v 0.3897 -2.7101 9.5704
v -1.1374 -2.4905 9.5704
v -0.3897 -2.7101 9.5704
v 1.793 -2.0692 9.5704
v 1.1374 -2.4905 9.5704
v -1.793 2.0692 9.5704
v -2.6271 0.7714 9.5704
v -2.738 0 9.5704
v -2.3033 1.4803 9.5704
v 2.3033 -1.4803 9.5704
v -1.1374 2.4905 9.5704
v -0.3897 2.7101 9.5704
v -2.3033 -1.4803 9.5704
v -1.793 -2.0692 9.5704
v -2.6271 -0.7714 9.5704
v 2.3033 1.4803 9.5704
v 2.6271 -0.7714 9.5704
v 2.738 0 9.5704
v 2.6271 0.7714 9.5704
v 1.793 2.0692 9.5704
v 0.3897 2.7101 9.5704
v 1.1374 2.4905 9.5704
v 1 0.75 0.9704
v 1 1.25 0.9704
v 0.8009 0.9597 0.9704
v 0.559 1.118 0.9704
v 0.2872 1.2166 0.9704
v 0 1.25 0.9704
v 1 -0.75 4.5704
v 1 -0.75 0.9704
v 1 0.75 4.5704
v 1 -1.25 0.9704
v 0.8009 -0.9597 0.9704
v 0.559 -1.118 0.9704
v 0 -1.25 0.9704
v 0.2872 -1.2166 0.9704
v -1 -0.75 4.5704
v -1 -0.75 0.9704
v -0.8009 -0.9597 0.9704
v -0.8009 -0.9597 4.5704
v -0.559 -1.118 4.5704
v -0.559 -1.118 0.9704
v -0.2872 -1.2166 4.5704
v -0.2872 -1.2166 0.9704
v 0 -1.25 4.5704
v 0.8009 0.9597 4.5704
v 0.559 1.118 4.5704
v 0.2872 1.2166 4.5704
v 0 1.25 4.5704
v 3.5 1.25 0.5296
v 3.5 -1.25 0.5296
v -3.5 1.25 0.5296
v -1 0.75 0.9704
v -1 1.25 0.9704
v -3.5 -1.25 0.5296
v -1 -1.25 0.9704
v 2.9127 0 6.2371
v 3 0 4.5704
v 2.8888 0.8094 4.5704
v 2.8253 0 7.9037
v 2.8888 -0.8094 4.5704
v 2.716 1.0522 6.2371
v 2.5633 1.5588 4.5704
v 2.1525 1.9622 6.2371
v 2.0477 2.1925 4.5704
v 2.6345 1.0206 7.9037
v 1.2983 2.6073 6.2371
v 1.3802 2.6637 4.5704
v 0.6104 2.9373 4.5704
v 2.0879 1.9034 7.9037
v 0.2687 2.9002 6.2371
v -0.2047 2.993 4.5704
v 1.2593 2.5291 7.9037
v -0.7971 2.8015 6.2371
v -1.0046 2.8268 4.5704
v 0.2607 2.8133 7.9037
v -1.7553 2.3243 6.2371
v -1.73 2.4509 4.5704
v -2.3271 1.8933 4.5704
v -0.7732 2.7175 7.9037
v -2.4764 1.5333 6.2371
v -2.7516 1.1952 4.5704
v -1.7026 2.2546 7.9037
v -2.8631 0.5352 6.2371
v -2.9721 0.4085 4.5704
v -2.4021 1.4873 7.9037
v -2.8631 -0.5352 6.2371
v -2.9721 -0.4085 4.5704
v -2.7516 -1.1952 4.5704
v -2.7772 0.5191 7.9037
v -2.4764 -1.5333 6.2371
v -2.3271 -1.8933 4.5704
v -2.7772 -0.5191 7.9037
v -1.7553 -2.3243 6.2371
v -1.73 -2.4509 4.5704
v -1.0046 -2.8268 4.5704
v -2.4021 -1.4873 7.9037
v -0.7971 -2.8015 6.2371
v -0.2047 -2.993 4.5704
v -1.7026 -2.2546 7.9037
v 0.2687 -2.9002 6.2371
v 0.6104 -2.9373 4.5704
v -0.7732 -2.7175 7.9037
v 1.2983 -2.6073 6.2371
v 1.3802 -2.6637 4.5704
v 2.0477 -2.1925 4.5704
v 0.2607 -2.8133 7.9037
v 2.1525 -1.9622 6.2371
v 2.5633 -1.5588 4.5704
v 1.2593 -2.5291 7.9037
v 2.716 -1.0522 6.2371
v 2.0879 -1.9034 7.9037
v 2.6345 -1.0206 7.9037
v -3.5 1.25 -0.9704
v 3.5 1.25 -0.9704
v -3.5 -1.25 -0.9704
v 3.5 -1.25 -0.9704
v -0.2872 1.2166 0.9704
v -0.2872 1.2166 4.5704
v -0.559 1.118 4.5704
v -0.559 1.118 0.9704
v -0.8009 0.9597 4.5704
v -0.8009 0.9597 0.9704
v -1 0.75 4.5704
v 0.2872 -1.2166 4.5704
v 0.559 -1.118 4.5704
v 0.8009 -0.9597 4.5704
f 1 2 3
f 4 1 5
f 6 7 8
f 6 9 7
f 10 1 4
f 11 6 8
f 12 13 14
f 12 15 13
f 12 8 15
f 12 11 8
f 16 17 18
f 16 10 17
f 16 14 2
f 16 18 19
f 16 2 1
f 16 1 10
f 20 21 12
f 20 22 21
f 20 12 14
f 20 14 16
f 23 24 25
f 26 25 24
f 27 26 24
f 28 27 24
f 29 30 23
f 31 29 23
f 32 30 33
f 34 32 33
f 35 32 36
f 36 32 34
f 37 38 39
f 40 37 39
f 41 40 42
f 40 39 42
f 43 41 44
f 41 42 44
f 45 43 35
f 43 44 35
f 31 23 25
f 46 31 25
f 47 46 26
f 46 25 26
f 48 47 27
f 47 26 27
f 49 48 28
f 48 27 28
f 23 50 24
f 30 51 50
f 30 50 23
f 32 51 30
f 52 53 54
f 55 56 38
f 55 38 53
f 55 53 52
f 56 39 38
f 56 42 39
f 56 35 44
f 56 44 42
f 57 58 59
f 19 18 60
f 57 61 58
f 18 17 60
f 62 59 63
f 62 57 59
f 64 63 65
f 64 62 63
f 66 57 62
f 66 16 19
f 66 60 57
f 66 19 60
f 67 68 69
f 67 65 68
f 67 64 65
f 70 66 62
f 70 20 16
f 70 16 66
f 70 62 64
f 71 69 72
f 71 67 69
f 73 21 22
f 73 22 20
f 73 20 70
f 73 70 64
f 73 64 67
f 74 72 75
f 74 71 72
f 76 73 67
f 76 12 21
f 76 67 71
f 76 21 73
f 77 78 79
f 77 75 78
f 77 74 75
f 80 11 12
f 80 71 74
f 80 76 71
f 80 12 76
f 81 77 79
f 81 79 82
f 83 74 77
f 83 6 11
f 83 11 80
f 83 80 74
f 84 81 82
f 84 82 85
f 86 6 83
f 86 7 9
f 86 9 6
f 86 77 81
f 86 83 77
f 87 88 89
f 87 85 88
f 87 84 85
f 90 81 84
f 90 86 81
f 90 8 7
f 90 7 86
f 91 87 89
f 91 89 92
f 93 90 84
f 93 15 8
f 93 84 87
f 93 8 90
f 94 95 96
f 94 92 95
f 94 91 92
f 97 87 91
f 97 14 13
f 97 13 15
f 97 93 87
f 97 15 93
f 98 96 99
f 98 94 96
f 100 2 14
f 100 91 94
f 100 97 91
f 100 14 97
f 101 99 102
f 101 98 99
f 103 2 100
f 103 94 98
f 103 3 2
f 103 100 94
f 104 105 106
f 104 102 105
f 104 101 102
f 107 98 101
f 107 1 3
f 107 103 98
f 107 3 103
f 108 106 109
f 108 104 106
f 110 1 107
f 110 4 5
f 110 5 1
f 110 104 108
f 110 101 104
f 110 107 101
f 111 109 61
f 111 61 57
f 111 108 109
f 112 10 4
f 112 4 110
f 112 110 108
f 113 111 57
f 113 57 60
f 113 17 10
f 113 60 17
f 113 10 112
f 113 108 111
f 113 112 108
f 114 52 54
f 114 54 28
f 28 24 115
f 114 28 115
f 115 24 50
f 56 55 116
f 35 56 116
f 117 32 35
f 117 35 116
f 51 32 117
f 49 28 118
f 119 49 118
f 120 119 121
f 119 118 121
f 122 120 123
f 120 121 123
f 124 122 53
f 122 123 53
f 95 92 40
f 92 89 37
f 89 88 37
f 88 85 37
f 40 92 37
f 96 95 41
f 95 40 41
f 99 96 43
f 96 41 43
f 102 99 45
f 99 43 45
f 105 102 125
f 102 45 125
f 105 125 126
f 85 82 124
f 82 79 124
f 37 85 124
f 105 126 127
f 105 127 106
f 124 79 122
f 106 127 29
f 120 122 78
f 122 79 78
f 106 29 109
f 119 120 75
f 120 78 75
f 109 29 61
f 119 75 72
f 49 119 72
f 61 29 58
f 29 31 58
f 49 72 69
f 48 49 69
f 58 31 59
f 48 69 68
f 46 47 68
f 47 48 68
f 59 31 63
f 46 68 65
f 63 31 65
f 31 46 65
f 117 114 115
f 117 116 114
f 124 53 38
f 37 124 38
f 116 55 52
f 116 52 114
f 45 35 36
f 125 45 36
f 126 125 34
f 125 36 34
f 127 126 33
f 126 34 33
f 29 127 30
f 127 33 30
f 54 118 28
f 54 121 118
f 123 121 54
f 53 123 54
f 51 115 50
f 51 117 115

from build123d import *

# Parameters (mm, degrees)
F1_DEPTH = 1.25
F3_DEPTH = 3.6
F4_R     = 3
F5_DEPTH = 5
F5_TAPER = 3


with BuildPart() as f1:
    # F0 (on Front) → F1 (new body, symmetric)
    with BuildSketch(Plane.XZ):
        Polygon((3.5, 0.5295912741), (1, 0.9704087259), (-1, 0.9704087259), (-3.5, 0.5295912741), (-3.5, -0.9704087259), (0, -0.9704087259), (3.5, -0.9704087259), align=None)
    extrude(amount=F1_DEPTH, both=True)

    # F2 (on face) → F3 (join)
    with BuildSketch(Plane.XY.offset(0.9704087259)):
        with BuildLine():
            Line((1, -0.75), (1, 0.75))
            ThreePointArc((1, 0.75), (0.5590169944, 1.1180339887), (0, 1.25))
            ThreePointArc((0, 1.25), (-0.5590169944, 1.1180339887), (-1, 0.75))
            Line((-1, 0.75), (-1, -0.75))
            ThreePointArc((-1, -0.75), (-0.5590169944, -1.1180339887), (0, -1.25))
            ThreePointArc((0, -1.25), (0.5590169944, -1.1180339887), (1, -0.75))
        make_face()
    extrude(amount=F3_DEPTH)

    # F4 (on face) → F5 (join)
    with BuildSketch(Plane.XY.offset(4.5704087259)):
        Circle(F4_R)
        with BuildLine():
            Line((1, 0.75), (1, -0.75))
            ThreePointArc((1, -0.75), (0, -1.25), (-1, -0.75))
            Line((-1, -0.75), (-1, 0.75))
            ThreePointArc((-1, 0.75), (0, 1.25), (1, 0.75))
        make_face(mode=Mode.SUBTRACT)
        with BuildLine():
            ThreePointArc((-1, -0.75), (0, -1.25), (1, -0.75))
            Line((1, -0.75), (1, 0.75))
            ThreePointArc((1, 0.75), (0, 1.25), (-1, 0.75))
            Line((-1, 0.75), (-1, -0.75))
        make_face()
    extrude(amount=F5_DEPTH, taper=F5_TAPER)


solid = f1.part
